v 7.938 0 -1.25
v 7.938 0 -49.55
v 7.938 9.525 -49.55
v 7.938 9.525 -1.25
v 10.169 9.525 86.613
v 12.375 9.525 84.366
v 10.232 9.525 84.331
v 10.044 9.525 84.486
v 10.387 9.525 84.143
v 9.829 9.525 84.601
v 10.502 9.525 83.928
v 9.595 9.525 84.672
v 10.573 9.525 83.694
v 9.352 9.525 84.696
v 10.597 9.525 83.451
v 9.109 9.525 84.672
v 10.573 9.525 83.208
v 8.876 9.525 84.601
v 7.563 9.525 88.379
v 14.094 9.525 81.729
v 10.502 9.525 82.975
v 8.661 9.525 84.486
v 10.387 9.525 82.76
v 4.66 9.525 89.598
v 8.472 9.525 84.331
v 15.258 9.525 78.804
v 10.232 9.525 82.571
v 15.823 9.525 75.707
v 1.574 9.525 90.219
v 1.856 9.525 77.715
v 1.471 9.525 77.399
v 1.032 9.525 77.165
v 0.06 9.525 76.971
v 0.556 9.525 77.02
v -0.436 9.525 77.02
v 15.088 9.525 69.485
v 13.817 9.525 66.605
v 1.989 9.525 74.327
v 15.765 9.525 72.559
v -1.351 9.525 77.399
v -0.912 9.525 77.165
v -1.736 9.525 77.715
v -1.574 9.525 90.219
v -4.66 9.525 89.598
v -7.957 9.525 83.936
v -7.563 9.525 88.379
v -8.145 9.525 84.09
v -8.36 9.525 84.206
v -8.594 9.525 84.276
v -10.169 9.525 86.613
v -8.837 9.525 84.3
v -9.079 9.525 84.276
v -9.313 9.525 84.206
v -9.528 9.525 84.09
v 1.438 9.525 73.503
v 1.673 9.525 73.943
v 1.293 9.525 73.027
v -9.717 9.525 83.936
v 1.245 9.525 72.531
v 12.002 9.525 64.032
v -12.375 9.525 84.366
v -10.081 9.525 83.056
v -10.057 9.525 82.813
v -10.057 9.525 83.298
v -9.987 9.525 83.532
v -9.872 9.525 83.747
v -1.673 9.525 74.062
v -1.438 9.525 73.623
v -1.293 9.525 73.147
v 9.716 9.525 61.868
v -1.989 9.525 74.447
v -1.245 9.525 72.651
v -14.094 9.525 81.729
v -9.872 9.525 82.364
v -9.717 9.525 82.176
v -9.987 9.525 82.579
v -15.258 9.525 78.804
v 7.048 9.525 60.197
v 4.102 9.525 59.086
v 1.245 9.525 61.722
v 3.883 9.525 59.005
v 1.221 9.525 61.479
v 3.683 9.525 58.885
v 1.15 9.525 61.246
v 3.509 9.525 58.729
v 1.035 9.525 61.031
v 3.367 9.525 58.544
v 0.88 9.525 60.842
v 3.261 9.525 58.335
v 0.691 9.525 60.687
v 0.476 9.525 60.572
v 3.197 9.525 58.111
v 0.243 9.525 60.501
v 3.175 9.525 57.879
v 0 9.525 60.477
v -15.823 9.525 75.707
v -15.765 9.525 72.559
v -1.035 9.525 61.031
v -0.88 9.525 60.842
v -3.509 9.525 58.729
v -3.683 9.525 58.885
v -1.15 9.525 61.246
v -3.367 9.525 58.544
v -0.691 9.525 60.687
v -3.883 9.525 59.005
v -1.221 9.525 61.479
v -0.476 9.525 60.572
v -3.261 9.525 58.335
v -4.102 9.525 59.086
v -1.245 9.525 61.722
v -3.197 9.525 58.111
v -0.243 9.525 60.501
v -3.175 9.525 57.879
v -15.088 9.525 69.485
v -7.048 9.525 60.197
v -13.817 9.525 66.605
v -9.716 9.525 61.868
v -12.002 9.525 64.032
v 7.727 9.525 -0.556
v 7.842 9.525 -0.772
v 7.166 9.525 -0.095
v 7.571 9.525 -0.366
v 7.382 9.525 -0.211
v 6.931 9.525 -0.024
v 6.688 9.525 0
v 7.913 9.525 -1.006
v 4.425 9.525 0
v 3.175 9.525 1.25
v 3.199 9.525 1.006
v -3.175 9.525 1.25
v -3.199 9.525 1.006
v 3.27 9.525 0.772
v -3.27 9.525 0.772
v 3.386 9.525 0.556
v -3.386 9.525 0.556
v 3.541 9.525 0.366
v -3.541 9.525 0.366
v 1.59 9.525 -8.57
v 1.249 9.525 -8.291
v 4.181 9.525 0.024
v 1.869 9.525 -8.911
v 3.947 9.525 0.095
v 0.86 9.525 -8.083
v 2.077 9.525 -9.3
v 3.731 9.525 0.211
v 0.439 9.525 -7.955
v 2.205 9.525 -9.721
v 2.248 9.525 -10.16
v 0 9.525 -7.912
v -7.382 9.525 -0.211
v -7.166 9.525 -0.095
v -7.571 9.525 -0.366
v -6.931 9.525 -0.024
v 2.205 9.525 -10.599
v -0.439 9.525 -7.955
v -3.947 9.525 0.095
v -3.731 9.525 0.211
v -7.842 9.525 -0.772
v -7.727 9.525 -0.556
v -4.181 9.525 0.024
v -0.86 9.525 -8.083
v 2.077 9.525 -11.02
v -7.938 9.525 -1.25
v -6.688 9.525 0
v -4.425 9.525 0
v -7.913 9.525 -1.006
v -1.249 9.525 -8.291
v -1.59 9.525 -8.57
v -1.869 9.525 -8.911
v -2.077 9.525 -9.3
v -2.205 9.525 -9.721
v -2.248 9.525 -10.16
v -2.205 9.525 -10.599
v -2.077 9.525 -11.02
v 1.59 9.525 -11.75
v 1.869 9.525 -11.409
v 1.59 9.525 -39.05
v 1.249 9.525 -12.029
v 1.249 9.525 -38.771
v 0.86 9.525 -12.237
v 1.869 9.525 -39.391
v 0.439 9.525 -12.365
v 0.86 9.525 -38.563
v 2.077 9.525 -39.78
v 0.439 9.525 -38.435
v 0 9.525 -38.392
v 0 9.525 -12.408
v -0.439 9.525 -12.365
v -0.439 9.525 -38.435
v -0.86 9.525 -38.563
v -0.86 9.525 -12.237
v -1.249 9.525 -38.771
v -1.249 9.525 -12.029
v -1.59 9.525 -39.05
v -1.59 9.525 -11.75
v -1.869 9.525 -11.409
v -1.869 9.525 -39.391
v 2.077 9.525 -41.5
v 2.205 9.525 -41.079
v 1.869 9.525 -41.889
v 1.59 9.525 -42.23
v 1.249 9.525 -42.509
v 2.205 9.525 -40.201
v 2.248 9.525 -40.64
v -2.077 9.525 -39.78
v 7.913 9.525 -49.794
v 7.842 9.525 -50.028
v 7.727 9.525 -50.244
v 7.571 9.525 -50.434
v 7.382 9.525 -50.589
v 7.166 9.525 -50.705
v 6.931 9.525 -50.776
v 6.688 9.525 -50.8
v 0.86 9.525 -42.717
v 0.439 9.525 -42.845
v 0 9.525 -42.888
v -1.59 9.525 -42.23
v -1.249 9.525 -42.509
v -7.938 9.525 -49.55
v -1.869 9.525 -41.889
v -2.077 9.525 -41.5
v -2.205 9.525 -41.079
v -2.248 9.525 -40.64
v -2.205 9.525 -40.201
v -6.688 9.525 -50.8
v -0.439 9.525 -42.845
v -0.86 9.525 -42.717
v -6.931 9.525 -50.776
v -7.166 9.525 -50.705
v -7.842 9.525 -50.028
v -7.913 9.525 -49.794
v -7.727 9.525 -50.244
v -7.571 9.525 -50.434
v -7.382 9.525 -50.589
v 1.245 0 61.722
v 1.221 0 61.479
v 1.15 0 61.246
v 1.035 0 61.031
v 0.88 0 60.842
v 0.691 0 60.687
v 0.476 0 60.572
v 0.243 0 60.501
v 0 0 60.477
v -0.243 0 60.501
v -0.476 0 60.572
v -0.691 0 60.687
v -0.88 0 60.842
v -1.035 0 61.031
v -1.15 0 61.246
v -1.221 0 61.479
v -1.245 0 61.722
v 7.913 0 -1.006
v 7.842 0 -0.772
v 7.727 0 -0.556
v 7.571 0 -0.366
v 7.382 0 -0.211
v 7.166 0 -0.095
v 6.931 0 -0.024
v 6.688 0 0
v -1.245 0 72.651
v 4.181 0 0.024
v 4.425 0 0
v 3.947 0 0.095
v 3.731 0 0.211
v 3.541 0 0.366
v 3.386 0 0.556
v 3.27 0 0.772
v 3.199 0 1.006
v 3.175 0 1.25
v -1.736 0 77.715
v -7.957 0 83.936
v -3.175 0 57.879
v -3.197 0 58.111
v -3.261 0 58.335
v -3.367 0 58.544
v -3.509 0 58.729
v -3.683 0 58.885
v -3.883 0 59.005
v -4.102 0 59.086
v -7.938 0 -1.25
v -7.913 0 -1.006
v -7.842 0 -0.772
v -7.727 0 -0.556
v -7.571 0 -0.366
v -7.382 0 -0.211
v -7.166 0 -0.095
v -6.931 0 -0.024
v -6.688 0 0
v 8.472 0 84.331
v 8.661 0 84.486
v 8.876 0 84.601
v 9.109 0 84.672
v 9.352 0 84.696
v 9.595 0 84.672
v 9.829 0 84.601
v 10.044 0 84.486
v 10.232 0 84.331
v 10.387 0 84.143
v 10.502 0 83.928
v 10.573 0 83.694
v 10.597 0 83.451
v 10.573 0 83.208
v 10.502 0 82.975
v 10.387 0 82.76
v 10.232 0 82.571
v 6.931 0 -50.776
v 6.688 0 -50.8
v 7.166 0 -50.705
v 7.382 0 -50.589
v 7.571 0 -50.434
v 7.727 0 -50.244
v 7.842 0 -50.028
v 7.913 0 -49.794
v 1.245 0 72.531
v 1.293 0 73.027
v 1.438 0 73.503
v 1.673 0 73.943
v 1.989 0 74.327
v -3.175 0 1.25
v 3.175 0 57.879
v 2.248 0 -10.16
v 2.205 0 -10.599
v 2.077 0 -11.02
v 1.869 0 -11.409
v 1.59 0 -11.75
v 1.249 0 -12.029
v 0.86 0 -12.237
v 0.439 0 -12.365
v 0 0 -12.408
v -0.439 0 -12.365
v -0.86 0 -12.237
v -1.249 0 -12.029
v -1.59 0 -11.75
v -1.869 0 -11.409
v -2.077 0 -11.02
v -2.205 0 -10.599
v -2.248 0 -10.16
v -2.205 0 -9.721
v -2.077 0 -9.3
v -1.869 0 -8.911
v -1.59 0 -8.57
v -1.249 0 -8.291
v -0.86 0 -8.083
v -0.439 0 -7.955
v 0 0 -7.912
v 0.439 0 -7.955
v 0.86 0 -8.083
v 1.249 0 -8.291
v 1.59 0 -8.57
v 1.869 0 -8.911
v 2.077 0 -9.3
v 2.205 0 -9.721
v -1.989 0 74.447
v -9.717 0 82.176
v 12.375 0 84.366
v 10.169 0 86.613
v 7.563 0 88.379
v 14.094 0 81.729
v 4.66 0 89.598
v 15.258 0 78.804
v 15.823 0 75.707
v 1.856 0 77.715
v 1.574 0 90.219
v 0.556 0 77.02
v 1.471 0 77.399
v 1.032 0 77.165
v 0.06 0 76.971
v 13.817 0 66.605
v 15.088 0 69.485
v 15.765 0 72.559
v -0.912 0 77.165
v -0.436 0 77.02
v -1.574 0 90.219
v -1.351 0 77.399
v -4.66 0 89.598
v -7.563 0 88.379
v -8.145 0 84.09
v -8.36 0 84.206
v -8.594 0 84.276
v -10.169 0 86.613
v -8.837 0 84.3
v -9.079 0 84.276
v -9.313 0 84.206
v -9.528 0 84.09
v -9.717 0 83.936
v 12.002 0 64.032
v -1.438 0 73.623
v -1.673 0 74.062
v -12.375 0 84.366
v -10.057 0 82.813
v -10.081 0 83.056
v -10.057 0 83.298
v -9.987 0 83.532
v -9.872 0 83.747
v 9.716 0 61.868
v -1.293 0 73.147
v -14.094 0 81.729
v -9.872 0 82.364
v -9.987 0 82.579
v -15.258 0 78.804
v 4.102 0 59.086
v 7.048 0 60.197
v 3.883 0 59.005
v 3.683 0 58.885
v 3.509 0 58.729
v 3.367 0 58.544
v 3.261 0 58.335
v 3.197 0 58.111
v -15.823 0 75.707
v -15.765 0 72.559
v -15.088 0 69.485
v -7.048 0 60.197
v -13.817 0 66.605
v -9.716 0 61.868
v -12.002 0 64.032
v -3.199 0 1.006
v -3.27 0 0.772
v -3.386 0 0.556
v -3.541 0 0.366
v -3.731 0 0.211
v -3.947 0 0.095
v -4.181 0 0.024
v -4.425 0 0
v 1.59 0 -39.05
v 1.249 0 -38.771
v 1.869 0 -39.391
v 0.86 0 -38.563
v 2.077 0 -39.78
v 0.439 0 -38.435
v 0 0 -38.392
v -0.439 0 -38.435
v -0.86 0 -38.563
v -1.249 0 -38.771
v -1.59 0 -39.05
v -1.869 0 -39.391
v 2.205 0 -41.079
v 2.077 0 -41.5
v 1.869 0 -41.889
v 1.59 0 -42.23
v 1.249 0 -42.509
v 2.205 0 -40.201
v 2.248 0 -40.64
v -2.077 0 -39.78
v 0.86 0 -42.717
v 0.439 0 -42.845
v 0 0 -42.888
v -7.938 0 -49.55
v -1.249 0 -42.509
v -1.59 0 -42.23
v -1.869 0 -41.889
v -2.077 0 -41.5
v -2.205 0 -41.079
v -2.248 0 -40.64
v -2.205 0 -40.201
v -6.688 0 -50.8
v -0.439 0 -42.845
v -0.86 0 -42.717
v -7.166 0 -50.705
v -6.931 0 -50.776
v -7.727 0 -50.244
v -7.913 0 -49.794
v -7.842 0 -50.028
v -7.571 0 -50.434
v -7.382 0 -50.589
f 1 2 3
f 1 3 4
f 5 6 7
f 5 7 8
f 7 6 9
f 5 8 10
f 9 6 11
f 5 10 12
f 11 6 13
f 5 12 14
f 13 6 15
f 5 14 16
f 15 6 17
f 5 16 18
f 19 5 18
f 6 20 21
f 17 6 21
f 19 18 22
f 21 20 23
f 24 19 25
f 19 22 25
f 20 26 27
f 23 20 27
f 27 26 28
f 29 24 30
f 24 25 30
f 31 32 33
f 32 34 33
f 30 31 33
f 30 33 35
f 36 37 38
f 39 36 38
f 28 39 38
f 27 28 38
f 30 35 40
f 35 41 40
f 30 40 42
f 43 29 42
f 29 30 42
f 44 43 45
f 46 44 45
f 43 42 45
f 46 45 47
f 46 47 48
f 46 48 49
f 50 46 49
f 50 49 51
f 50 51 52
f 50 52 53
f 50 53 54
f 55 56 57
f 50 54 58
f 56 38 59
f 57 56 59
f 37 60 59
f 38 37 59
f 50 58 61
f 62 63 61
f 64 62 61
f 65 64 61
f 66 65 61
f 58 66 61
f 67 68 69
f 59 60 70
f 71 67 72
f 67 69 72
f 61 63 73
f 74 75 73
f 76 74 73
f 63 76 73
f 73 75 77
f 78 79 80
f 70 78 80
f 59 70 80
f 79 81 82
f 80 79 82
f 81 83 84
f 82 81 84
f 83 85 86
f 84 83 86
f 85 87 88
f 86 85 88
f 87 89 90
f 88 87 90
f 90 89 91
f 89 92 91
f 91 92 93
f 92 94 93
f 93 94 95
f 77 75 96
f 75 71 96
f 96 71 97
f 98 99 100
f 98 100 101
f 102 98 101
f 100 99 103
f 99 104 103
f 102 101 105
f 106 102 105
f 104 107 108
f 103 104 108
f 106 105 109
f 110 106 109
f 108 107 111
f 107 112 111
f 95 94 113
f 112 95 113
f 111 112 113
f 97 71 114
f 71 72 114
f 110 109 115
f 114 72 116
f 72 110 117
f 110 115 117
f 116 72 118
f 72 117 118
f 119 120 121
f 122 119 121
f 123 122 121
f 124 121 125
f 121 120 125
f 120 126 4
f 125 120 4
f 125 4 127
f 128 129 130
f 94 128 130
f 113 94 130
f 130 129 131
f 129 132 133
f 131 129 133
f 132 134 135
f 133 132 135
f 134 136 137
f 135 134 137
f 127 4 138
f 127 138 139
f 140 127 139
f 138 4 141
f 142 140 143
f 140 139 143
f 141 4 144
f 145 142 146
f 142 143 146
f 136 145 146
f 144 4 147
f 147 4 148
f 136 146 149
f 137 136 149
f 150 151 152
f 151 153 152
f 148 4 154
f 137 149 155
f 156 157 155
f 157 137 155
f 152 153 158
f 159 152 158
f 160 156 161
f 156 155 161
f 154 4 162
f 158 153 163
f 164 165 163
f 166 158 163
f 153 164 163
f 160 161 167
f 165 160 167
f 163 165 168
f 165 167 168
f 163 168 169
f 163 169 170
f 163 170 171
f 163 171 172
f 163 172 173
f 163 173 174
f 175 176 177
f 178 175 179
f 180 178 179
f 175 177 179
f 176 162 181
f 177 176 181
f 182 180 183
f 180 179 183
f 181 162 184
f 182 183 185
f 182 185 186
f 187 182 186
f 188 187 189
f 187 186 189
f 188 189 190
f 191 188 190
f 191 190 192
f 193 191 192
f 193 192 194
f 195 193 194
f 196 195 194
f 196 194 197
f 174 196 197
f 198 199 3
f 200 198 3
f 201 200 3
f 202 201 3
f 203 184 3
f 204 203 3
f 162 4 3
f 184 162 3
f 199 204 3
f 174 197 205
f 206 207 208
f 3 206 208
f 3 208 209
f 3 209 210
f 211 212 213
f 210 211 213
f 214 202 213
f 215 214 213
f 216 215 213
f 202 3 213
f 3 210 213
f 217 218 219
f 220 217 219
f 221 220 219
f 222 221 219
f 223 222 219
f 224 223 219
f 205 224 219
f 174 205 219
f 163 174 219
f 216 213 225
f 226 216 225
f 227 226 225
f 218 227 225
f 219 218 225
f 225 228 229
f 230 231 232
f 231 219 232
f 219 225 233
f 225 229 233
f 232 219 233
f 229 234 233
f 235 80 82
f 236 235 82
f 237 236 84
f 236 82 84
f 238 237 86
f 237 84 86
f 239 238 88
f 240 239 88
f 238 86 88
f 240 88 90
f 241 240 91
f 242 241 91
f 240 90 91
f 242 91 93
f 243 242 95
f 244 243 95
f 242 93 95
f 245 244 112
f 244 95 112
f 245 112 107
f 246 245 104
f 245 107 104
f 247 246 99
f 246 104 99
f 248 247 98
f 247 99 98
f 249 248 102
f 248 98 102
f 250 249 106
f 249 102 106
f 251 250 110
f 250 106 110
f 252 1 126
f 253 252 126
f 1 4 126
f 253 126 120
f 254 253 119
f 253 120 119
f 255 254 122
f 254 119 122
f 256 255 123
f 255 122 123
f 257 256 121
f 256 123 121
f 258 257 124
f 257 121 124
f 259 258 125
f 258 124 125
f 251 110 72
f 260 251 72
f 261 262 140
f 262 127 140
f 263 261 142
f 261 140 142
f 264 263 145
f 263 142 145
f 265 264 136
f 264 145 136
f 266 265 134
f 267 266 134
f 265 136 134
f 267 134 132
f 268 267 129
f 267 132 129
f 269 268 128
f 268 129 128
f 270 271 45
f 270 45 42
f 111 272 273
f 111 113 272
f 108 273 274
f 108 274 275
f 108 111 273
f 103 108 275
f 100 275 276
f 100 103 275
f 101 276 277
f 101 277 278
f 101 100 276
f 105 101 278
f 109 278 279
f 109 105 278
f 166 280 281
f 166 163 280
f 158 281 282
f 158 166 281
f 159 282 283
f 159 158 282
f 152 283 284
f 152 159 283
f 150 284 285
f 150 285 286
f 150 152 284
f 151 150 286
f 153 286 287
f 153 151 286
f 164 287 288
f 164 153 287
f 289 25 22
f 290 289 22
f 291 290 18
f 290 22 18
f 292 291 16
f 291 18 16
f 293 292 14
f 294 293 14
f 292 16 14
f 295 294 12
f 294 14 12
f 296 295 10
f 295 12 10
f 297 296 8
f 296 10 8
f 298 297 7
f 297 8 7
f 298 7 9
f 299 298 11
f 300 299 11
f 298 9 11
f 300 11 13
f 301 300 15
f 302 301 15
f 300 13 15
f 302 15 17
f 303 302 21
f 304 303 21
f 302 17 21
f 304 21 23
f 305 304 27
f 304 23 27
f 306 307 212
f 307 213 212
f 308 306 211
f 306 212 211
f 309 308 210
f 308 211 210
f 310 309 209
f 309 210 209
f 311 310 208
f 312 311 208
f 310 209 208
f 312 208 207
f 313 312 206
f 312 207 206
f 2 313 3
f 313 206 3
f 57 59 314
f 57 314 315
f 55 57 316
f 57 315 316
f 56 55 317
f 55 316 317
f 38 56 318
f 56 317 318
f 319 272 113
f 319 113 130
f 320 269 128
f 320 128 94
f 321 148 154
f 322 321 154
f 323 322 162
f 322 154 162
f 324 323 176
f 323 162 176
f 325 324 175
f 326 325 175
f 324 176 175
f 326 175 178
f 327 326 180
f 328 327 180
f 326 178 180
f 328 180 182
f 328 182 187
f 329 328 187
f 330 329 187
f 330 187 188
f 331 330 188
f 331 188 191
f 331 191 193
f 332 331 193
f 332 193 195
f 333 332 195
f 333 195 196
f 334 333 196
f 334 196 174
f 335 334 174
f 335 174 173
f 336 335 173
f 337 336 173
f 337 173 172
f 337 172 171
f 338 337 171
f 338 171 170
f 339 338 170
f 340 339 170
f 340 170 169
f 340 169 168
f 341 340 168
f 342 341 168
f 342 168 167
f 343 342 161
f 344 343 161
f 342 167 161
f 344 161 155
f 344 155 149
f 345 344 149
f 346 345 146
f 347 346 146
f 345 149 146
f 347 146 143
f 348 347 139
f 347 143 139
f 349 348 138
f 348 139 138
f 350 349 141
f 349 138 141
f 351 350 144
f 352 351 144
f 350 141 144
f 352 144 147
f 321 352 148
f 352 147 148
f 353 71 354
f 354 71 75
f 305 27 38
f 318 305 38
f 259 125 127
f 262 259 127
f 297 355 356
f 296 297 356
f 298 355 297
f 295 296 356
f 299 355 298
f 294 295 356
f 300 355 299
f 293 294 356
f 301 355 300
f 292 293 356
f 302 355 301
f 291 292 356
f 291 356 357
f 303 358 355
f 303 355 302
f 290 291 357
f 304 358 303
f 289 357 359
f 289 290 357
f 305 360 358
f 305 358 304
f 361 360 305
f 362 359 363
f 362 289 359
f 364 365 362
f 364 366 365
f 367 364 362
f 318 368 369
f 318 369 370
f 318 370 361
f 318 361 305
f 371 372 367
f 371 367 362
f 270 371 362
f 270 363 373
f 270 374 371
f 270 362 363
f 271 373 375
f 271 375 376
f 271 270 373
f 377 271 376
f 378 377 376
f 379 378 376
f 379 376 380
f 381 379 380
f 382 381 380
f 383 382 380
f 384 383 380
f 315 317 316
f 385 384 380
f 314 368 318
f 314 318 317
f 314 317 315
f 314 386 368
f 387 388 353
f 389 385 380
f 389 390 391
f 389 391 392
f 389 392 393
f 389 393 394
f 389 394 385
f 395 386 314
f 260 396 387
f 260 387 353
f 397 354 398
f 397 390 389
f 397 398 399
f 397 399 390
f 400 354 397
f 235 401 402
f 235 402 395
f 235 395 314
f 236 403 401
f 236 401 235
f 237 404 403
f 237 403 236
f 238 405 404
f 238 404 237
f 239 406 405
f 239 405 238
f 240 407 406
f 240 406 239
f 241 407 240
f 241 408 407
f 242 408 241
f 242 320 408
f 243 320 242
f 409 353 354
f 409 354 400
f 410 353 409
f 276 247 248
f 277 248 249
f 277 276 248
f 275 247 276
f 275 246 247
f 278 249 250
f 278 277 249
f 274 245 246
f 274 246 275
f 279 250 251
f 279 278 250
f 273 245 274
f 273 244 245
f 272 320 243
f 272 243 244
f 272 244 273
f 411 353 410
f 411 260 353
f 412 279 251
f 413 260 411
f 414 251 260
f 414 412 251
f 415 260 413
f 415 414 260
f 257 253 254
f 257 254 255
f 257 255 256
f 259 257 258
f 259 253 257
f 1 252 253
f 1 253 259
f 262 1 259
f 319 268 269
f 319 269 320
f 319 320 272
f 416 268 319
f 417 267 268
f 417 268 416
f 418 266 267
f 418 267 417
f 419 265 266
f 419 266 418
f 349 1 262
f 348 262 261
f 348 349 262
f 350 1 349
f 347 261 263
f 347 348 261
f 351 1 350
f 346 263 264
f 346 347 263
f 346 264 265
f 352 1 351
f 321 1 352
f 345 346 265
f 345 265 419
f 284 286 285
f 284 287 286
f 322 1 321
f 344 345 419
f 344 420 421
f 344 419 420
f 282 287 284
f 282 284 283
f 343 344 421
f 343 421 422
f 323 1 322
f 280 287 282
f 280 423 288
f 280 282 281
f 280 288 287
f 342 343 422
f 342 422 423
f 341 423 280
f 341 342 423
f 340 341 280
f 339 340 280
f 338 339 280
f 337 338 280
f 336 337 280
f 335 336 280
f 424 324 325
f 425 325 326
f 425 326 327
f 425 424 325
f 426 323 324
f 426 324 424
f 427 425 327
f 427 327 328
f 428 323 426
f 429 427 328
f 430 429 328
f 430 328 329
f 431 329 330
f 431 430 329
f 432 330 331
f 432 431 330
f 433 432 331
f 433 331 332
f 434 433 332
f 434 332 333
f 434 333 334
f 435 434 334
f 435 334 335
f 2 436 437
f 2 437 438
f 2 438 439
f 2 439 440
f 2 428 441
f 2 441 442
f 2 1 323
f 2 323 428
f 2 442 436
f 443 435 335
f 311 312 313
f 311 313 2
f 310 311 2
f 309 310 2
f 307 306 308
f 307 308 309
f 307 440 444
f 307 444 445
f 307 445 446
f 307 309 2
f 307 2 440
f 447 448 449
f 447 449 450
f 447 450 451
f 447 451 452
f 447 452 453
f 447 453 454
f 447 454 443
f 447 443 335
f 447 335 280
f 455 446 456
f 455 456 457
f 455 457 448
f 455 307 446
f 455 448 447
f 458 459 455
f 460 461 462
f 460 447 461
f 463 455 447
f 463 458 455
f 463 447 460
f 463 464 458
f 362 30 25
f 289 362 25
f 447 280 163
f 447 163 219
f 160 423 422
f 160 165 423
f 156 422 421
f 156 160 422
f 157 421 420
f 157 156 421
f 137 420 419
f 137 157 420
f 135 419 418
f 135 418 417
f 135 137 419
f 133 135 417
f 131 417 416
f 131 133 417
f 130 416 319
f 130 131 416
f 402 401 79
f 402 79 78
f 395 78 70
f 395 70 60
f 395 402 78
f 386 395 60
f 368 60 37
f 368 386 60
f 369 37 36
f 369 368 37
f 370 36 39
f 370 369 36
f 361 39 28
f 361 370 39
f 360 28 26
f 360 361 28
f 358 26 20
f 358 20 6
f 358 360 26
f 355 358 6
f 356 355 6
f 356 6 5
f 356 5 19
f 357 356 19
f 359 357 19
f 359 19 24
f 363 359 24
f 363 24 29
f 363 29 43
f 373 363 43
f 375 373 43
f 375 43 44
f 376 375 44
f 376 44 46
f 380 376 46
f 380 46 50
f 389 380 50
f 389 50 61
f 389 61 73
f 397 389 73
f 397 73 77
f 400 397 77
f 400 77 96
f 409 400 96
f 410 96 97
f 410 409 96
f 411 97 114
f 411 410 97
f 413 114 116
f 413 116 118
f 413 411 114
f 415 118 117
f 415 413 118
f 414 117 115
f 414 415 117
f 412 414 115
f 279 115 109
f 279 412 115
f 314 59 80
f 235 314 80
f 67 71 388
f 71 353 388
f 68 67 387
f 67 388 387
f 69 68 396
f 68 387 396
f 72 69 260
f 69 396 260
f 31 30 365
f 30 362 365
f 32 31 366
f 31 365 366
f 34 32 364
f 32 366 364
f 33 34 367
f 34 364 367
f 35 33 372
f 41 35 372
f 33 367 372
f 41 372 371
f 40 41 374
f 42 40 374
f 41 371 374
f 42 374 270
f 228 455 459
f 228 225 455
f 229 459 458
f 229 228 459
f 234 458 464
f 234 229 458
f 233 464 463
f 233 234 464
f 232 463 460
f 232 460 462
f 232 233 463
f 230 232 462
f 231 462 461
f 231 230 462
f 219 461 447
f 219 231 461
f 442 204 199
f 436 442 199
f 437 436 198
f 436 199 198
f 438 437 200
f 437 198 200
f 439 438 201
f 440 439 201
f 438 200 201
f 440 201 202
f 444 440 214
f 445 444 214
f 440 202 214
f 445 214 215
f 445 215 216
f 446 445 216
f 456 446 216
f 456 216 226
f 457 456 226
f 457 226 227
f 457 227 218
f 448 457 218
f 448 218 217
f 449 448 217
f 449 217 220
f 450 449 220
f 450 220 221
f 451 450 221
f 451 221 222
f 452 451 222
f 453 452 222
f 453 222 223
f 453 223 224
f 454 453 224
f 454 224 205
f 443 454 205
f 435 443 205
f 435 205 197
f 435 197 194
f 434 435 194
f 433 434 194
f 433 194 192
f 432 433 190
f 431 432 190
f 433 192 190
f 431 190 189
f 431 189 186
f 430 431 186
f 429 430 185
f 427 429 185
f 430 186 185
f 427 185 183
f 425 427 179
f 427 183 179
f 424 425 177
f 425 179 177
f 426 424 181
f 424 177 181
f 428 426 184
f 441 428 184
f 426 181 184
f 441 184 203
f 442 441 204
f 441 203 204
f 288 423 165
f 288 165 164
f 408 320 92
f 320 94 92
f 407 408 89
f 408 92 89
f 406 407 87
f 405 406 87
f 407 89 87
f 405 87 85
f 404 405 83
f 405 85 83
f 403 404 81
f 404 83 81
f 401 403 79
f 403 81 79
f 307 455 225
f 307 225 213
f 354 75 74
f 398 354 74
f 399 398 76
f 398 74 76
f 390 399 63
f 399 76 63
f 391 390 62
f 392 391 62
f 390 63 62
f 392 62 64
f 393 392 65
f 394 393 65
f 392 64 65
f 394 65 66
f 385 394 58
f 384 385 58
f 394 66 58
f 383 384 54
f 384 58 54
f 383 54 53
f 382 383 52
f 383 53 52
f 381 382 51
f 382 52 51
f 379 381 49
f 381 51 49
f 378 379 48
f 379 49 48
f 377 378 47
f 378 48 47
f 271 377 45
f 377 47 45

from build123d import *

# Parameters (mm, degrees)
BOSS_EXTRUDE1_DEPTH = 9.525
SKETCH2_R           = 2.2479
CUT_EXTRUDE1_DEPTH  = 10.525
CUT_EXTRUDE2_DEPTH  = 10.525
FILLET1_R           = 1.25
FILLET2_R           = 2.54


with BuildPart() as part:
    # Sketch1 → Boss-Extrude1 (new body)
    with BuildSketch(Plane(origin=(0, 0, 0), x_dir=(1, 0, 0), z_dir=(0, 1, 0))):
        with BuildLine():
            Line((-7.9375, 50.8), (7.9375, 50.8))
            Line((7.9375, 50.8), (7.9375, 0))
            Line((7.9375, 0), (3.175, 0))
            Line((3.175, 0), (3.175, -58.867740133))
            ThreePointArc((3.175, -58.867740133), (0, -90.297), (-3.175, -58.867740133))
            Line((-3.175, -58.867740133), (-3.175, 0))
            Line((-3.175, 0), (-7.9375, 0))
            Line((-7.9375, 0), (-7.9375, 50.8))
        make_face()
    extrude(amount=BOSS_EXTRUDE1_DEPTH)

    # Sketch2 → Cut-Extrude1 (cut, through all)
    with BuildSketch(Plane(origin=(0, 9.525, 0), x_dir=(1, 0, 0), z_dir=(0, 1, 0))):
        with Locations((0, 40.64)):
            Circle(SKETCH2_R)
        with Locations((0, 10.16)):
            Circle(SKETCH2_R)
    extrude(amount=-CUT_EXTRUDE1_DEPTH, mode=Mode.SUBTRACT)

    # Sketch3 → Cut-Extrude2 (cut, through all)
    with BuildSketch(Plane(origin=(0, 9.525, 0), x_dir=(1, 0, 0), z_dir=(0, 1, 0))):
        with BuildLine():
            Line((0.059974982, -75.919115272), (8.472150299, -84.331290589))
            ThreePointArc((8.472150299, -84.331290589), (10.232280498, -84.331290589), (10.232280498, -82.571160389))
            Line((10.232280498, -82.571160389), (1.2446, -73.583479891))
            Line((1.2446, -73.583479891), (1.2446, -61.722))
            ThreePointArc((1.2446, -61.722), (0, -60.4774), (-1.2446, -61.722))
            Line((-1.2446, -61.722), (-1.2446, -73.703429855))
            Line((-1.2446, -73.703429855), (-9.716750299, -82.175580154))
            ThreePointArc((-9.716750299, -82.175580154), (-9.716750299, -83.935710353), (-7.956620099, -83.935710353))
            Line((-7.956620099, -83.935710353), (0.059974982, -75.919115272))
        make_face()
    extrude(amount=-CUT_EXTRUDE2_DEPTH, mode=Mode.SUBTRACT)

    # Fillet1
    fillet1_edges = [part.edges().sort_by_distance(p)[0] for p in [
        (-7.9375, 4.7625, -50.8),
        (7.9375, 4.7625, -50.8),
        (7.9375, 4.7625, 0),
        (3.175, 4.7625, 0),
        (3.175, 4.7625, 58.867740133),
        (-3.175, 4.7625, 58.867740133),
        (-3.175, 4.7625, 0),
        (-7.9375, 4.7625, 0),
    ]]
    fillet(fillet1_edges, radius=FILLET1_R)

    # Fillet2
    fillet2_edges = [part.edges().sort_by_distance(p)[0] for p in [
        (1.2446, 4.7625, 73.583479891),
        (0.059974982, 4.7625, 75.919115272),
        (-1.2446, 4.7625, 73.703429855),
    ]]
    fillet(fillet2_edges, radius=FILLET2_R)


solid = part.part
